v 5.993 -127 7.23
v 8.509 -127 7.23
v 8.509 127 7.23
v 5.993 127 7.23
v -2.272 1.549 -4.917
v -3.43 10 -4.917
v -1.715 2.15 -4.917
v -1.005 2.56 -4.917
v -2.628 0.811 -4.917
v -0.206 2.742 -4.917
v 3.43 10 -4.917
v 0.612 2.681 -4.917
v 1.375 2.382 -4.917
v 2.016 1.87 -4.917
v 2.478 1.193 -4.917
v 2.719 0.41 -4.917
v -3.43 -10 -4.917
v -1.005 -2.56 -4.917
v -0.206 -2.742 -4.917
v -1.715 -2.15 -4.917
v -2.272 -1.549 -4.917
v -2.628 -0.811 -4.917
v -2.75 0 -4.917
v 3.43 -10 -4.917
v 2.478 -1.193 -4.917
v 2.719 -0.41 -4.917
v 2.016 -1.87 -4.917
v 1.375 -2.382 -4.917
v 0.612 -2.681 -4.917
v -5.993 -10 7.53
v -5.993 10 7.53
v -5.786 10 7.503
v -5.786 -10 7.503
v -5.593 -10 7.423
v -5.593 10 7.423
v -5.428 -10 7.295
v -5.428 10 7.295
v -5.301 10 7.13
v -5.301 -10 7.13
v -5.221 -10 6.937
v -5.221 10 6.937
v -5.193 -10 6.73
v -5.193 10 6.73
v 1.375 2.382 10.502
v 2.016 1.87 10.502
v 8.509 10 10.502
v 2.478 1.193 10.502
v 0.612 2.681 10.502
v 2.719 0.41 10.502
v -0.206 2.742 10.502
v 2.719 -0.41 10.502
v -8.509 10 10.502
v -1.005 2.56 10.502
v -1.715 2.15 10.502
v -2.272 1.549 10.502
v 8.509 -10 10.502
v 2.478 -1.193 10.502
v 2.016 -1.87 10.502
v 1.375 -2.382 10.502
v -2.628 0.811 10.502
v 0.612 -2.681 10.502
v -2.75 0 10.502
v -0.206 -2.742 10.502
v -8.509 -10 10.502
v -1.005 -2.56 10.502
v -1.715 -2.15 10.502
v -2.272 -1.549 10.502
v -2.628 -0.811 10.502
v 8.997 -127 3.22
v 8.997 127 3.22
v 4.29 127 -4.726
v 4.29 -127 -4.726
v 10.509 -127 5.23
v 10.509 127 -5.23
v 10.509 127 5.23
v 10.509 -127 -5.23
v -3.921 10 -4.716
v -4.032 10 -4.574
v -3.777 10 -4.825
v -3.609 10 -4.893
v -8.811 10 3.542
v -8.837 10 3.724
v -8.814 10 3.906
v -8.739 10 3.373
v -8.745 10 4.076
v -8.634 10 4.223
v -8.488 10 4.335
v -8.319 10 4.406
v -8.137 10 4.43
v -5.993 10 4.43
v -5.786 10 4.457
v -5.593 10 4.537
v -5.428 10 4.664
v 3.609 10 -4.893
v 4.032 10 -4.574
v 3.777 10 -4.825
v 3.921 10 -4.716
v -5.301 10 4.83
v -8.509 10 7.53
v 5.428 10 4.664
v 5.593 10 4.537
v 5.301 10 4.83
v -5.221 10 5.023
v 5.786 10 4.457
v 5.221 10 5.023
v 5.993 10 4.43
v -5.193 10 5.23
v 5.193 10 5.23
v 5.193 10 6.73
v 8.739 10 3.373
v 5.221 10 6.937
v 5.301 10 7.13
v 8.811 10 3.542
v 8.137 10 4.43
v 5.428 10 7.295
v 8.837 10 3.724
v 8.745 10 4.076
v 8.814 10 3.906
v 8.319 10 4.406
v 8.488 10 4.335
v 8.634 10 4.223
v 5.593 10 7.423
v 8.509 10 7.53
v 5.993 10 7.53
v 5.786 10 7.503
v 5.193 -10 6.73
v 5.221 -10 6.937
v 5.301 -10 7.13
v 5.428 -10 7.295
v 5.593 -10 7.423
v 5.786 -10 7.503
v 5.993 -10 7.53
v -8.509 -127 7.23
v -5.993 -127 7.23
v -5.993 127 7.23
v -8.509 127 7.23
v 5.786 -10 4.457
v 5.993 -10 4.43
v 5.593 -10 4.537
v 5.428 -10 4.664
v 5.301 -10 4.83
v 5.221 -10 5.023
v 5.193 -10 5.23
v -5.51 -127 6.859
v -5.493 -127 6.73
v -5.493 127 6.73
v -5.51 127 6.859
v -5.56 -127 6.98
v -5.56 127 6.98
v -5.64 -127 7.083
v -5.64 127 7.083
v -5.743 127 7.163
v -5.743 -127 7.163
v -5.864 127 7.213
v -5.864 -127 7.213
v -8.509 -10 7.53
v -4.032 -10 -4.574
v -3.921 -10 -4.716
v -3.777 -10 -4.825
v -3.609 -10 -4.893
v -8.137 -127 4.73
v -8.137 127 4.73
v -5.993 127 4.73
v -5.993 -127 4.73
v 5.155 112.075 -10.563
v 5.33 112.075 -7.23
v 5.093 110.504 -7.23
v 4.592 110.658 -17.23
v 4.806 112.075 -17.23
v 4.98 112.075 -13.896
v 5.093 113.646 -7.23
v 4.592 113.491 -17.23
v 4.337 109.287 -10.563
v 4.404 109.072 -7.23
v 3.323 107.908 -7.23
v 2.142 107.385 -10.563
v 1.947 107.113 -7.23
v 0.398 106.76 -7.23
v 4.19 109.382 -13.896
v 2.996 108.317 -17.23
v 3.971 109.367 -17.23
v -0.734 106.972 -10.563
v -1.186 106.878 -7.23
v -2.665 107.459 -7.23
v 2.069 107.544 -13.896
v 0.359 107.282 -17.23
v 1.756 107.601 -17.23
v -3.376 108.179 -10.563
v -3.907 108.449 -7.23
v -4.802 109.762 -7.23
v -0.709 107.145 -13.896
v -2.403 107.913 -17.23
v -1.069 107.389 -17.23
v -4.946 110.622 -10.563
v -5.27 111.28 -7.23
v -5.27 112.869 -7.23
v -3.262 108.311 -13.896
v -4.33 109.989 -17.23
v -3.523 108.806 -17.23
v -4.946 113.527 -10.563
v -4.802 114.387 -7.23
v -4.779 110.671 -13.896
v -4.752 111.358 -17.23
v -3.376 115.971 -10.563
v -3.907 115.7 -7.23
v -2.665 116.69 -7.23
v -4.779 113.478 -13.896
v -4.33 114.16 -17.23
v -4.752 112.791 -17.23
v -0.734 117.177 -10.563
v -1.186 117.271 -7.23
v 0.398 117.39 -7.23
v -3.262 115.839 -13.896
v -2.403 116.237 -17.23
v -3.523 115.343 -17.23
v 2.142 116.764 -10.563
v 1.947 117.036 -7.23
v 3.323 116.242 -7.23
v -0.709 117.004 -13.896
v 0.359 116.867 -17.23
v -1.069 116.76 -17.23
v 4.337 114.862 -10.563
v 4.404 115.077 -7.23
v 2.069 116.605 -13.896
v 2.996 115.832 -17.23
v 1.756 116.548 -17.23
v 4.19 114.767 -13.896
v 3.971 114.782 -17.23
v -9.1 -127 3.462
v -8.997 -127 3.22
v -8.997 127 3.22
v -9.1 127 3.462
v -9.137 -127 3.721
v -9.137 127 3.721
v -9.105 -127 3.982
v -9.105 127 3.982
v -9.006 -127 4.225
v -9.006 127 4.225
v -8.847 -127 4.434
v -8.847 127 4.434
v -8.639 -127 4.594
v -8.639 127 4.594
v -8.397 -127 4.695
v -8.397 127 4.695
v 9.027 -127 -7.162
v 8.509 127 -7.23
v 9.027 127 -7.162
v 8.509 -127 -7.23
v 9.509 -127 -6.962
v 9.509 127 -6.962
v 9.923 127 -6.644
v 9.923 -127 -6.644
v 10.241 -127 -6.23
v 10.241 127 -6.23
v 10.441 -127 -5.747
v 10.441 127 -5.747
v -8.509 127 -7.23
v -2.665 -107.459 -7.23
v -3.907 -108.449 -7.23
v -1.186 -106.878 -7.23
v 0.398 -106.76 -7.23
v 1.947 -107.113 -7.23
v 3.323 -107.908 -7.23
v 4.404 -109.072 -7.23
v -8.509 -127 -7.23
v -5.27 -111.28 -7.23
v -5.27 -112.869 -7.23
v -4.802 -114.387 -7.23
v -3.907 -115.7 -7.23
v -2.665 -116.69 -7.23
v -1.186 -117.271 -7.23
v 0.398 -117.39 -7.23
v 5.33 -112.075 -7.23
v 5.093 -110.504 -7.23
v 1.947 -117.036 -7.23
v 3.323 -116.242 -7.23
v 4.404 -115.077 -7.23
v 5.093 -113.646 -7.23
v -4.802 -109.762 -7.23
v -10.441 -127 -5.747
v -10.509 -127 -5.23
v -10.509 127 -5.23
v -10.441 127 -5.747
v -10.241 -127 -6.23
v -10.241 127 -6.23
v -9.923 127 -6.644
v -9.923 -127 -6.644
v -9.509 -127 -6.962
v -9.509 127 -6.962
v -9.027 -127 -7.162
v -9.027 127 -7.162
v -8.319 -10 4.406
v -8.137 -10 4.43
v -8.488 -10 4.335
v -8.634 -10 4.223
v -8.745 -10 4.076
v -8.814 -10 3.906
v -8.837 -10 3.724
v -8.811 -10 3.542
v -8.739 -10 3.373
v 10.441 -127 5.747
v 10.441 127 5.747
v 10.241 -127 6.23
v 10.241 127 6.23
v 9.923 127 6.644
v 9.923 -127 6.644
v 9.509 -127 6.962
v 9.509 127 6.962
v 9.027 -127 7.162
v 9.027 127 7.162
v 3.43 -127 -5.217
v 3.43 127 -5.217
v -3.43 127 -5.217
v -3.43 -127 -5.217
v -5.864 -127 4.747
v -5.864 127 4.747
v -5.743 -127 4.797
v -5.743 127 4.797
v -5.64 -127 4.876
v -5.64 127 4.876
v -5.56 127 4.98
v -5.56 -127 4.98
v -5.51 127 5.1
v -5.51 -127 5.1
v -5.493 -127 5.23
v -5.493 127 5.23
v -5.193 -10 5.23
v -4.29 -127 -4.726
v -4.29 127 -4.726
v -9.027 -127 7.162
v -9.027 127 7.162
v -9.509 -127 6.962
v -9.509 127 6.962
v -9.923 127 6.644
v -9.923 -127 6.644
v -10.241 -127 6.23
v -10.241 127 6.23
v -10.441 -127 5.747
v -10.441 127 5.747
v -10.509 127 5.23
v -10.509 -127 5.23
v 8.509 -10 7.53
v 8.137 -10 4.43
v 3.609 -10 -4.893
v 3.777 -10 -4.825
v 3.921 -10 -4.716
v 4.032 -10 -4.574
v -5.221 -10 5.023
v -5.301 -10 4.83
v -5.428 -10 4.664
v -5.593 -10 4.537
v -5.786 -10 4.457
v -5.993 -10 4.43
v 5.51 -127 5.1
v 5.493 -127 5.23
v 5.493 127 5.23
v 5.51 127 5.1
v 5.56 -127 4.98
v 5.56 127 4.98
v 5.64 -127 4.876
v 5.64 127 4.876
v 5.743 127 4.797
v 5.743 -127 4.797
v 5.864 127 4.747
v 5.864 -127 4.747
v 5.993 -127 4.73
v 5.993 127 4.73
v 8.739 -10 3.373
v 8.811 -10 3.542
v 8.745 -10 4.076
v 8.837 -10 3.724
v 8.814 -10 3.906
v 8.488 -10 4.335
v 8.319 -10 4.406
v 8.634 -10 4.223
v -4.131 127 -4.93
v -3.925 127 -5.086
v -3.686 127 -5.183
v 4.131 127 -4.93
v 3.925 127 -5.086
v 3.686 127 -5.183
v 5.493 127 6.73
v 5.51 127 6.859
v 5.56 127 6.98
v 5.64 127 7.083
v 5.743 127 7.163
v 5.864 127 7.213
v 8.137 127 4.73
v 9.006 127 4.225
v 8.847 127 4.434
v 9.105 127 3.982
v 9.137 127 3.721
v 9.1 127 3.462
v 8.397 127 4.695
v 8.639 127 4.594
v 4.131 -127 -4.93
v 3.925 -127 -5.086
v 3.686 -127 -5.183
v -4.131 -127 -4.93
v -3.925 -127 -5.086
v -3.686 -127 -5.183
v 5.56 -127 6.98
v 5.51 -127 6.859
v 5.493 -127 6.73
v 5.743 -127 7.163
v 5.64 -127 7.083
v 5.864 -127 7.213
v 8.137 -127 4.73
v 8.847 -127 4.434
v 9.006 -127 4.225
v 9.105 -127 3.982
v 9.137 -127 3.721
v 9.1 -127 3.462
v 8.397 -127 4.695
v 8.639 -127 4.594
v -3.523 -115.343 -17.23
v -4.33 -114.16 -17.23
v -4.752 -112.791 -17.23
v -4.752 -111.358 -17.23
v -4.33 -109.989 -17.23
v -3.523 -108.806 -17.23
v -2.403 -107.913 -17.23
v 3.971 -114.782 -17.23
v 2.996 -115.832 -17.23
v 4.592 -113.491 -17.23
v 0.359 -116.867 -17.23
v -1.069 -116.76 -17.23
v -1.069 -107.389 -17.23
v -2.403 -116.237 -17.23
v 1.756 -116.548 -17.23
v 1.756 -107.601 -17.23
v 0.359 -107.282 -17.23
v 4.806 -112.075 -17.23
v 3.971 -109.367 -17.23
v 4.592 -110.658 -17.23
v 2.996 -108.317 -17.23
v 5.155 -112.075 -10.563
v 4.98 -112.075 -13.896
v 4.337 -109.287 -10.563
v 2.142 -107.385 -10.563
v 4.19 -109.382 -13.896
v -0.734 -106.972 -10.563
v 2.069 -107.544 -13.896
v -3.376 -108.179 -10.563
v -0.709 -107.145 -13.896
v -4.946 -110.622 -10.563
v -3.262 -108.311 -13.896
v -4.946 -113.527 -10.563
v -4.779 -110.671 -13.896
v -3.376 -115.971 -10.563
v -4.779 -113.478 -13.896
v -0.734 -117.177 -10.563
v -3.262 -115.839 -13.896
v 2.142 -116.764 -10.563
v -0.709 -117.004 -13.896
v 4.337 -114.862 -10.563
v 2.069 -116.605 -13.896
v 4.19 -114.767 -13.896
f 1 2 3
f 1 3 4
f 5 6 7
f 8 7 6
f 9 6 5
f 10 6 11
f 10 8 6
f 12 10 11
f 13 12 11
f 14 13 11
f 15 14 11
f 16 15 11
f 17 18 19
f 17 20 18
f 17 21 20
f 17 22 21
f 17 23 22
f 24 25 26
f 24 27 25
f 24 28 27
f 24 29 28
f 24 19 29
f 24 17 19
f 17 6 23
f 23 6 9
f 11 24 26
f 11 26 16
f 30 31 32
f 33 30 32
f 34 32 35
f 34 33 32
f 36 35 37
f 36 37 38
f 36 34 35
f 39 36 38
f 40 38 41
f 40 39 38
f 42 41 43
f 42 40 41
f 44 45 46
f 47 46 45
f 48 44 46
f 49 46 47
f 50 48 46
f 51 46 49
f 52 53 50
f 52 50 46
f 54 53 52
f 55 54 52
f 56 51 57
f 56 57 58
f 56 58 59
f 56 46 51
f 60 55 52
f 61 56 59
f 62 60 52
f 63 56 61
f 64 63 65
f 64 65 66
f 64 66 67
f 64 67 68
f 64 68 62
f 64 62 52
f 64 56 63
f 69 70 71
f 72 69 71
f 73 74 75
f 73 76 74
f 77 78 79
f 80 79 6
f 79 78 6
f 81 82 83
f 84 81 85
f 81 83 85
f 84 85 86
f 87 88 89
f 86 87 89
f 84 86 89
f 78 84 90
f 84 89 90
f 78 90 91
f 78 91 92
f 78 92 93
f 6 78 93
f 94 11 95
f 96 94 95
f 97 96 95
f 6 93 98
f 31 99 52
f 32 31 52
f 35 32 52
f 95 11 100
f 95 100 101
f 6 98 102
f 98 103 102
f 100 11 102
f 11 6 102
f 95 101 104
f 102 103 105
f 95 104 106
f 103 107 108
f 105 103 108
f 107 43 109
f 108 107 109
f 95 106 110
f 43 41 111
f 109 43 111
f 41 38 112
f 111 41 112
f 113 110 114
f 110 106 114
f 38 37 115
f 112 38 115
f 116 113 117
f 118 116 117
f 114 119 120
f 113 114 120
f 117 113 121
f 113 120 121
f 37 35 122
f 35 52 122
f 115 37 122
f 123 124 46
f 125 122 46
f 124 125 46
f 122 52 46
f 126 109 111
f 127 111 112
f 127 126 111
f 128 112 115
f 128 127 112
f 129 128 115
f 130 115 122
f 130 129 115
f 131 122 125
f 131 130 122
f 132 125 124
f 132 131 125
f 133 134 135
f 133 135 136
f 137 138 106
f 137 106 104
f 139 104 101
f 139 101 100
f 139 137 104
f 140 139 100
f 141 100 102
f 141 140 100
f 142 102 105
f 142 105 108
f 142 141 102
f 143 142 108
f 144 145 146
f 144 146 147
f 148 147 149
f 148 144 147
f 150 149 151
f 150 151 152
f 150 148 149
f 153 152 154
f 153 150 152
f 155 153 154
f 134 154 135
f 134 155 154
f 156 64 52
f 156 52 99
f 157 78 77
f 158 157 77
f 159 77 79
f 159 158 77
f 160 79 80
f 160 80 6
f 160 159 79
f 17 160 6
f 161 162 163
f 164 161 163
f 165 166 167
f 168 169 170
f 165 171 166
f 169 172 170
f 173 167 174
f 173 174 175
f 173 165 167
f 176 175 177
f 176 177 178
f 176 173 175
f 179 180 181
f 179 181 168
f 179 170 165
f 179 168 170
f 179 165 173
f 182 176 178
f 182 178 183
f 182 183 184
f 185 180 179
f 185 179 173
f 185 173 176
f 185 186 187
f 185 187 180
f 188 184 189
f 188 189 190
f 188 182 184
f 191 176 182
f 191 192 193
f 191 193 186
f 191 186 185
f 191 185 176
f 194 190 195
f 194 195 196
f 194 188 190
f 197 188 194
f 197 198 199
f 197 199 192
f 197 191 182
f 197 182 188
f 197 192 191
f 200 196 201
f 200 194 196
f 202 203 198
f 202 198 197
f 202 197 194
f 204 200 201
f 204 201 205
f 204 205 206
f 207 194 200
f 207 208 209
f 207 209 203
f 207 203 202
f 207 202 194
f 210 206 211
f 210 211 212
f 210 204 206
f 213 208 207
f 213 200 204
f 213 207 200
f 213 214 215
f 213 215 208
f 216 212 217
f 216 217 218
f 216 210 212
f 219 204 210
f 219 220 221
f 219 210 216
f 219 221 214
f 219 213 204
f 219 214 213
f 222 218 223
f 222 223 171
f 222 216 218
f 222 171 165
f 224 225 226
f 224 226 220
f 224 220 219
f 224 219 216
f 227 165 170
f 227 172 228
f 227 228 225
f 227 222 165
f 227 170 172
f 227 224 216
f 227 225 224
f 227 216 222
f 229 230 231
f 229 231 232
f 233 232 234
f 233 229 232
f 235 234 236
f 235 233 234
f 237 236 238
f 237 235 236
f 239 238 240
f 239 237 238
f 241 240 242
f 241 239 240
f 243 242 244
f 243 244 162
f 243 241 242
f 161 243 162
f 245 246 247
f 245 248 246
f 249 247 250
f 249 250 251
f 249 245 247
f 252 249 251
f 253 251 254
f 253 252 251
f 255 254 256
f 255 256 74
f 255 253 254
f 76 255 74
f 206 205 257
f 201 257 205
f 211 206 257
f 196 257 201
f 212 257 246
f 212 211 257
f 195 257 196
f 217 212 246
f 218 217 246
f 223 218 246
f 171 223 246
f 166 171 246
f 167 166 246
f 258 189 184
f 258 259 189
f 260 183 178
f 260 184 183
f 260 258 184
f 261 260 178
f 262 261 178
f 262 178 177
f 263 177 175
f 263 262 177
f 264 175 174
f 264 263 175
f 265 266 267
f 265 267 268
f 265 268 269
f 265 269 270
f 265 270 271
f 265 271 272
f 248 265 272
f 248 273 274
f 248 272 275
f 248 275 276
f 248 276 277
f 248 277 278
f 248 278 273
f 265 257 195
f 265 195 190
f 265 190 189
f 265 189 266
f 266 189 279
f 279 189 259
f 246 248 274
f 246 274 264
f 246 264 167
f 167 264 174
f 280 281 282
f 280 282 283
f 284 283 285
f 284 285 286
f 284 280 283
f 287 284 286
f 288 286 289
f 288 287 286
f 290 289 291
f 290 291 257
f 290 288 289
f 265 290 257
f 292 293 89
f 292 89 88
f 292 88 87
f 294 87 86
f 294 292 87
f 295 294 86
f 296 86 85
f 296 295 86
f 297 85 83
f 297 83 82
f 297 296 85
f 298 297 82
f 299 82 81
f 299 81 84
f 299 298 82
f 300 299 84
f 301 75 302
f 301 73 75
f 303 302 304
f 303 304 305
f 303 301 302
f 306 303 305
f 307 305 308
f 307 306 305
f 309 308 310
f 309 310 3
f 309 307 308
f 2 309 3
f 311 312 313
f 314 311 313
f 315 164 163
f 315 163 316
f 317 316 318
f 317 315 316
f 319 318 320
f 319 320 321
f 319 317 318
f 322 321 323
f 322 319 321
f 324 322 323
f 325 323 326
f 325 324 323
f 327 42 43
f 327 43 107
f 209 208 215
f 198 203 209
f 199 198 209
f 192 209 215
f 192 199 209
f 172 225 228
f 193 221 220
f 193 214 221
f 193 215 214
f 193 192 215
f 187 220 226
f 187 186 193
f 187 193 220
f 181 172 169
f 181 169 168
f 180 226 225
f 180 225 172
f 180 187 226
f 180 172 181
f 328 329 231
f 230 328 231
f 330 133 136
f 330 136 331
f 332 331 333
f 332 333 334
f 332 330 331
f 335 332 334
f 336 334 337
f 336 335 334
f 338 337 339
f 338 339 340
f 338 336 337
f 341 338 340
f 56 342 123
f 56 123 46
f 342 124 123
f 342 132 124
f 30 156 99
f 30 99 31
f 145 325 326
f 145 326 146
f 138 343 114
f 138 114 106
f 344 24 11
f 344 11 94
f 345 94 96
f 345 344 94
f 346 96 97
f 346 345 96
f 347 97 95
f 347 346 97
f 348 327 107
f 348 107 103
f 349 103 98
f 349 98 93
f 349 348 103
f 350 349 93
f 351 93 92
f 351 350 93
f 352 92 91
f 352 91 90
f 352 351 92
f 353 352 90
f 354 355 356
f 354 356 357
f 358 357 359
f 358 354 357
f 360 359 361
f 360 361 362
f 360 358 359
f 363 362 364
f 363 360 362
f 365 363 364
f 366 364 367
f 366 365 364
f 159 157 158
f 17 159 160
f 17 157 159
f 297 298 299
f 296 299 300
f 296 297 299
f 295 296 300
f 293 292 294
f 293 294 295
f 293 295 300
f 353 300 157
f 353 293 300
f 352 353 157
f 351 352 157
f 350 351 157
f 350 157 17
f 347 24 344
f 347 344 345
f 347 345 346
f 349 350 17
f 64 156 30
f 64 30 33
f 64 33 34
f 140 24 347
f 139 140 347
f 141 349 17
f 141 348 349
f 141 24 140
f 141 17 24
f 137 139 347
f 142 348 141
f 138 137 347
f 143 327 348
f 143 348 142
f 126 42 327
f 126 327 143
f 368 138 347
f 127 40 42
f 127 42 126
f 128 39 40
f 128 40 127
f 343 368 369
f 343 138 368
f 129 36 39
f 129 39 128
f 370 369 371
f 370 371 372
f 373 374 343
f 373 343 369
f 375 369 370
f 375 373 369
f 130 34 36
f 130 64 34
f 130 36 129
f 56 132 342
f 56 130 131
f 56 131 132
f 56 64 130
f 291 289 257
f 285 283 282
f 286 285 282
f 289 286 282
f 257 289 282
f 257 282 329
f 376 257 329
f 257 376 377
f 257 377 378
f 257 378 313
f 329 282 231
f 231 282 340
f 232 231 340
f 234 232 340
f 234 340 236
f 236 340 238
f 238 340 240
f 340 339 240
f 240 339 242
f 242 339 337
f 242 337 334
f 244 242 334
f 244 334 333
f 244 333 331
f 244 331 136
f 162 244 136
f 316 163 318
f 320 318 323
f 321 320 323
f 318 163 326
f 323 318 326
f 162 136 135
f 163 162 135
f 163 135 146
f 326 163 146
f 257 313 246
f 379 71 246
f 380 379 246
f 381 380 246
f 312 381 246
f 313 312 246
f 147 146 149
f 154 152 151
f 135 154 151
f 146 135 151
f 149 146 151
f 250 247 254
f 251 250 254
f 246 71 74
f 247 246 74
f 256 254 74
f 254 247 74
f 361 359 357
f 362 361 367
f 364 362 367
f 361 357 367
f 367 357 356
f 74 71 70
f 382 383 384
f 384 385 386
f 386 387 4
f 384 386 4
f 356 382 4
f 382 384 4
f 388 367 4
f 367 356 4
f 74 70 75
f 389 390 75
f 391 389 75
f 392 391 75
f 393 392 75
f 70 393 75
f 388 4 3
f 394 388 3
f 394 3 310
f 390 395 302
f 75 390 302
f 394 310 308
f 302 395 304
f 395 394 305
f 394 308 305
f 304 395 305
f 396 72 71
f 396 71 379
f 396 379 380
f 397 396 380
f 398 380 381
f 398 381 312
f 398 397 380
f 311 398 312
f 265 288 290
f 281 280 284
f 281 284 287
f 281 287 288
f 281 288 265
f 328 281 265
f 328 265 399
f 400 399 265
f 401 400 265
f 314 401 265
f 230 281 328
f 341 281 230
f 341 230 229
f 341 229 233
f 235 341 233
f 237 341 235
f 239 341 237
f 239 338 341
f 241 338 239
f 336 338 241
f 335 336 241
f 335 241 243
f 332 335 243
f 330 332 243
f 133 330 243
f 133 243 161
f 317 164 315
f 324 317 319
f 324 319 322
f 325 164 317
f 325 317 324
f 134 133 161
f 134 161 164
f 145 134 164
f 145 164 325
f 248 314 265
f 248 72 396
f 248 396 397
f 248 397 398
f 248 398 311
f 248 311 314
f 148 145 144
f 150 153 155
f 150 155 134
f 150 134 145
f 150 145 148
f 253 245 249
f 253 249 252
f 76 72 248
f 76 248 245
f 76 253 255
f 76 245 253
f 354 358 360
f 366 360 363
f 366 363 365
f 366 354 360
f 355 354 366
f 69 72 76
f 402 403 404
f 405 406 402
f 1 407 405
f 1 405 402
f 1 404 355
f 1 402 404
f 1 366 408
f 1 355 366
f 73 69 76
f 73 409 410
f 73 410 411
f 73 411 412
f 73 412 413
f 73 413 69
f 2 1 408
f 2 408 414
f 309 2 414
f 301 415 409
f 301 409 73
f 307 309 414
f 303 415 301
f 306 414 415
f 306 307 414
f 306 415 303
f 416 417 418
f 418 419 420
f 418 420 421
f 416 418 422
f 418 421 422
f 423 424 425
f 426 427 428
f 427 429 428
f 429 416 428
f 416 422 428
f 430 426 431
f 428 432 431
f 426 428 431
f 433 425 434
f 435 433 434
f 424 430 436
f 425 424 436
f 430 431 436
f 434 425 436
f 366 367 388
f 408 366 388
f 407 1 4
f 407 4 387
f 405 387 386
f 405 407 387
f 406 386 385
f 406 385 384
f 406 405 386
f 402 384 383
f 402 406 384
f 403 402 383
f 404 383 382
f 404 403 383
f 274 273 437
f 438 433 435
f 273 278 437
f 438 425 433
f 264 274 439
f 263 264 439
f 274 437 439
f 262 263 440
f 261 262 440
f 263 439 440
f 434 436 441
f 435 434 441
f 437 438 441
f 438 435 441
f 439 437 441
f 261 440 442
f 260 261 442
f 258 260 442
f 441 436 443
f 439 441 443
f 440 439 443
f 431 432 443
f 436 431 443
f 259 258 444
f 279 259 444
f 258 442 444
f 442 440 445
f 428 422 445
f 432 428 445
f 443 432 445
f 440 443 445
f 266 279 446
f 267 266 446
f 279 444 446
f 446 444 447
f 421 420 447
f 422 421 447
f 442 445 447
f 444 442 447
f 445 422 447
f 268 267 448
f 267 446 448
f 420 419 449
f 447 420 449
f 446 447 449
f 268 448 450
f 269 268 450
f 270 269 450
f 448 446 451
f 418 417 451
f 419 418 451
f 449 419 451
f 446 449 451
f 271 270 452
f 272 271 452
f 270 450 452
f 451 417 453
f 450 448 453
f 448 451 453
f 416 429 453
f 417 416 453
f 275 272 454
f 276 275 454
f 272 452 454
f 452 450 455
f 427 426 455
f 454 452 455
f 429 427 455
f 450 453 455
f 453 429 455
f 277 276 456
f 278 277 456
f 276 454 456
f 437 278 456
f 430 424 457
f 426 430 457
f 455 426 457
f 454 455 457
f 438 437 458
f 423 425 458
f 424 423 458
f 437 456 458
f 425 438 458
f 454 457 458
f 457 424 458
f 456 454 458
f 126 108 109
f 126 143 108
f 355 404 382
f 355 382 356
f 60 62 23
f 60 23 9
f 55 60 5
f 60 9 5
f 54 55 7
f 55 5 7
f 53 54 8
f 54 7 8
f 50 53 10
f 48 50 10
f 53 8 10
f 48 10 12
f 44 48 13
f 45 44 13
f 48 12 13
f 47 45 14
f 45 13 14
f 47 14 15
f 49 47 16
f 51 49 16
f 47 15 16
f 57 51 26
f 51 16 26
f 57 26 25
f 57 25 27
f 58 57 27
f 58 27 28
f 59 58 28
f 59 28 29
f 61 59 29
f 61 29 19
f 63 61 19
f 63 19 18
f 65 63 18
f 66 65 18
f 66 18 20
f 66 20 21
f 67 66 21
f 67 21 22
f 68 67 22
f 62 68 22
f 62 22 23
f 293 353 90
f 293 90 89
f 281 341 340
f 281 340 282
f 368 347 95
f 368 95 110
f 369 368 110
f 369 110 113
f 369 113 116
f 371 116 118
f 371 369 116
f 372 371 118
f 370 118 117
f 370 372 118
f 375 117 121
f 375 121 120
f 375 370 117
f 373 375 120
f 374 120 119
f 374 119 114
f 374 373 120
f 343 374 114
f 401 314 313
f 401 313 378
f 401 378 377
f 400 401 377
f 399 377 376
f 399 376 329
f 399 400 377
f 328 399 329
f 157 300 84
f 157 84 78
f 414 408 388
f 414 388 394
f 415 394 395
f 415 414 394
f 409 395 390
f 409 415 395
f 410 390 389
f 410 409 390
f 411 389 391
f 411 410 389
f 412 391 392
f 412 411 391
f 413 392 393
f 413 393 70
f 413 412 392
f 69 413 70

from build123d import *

# Parameters (mm, degrees)
F1_DEPTH = 127
F3_DEPTH = 10
F5_D     = 5.5
F5_DEPTH = 90
F5_TIP   = 1.6523667023
F6_R     = 5.3298784099
F7_DEPTH = 10
F7_TAPER = 3


# Not quite as in the source:
# - a pattern or mirror of a feature is missing from the dataset's text; its kind, count and spacing are read off the source's solid


with BuildPart() as f1:
    # F0 (on Front) → F1 (new body, symmetric)
    with BuildSketch(Plane.XZ):
        with BuildLine():
            ThreePointArc((10.5092503586, 5.2297932934), (9.923463921, 6.6440068557), (8.5092503586, 7.2297932934))
            Line((8.5092503586, 7.2297932934), (5.9933694905, 7.2297932934))
            ThreePointArc((5.9933694905, 7.2297932934), (5.6398160999, 7.083346684), (5.4933694905, 6.7297932934))
            Line((5.4933694905, 6.7297932934), (5.4933694905, 5.2297932934))
            ThreePointArc((5.4933694905, 5.2297932934), (5.6398160999, 4.8762399028), (5.9933694905, 4.7297932934))
            Line((5.9933694905, 4.7297932934), (8.1368030805, 4.7297932934))
            ThreePointArc((8.1368030805, 4.7297932934), (9.0055991387, 4.2249633746), (8.9972067099, 3.220180112))
            Line((8.9972067099, 3.220180112), (4.2904538965, -4.726449511))
            ThreePointArc((4.2904538965, -4.726449511), (3.9252203484, -5.0856323878), (3.4300502672, -5.2168363297))
            Line((3.4300502672, -5.2168363297), (0, -5.2168363297))
            Line((0, -5.2168363297), (-3.4300502672, -5.2168363297))
            ThreePointArc((-3.4300502672, -5.2168363297), (-3.9252203484, -5.0856323878), (-4.2904538965, -4.726449511))
            Line((-4.2904538965, -4.726449511), (-8.9972067099, 3.220180112))
            ThreePointArc((-8.9972067099, 3.220180112), (-9.0055991387, 4.2249633746), (-8.1368030805, 4.7297932934))
            Line((-8.1368030805, 4.7297932934), (-5.9933694905, 4.7297932934))
            ThreePointArc((-5.9933694905, 4.7297932934), (-5.6398160999, 4.8762399028), (-5.4933694905, 5.2297932934))
            Line((-5.4933694905, 5.2297932934), (-5.4933694905, 6.7297932934))
            ThreePointArc((-5.4933694905, 6.7297932934), (-5.6398160999, 7.083346684), (-5.9933694905, 7.2297932934))
            Line((-5.9933694905, 7.2297932934), (-8.5092503586, 7.2297932934))
            ThreePointArc((-8.5092503586, 7.2297932934), (-9.923463921, 6.6440068557), (-10.5092503586, 5.2297932934))
            Line((-10.5092503586, 5.2297932934), (-10.5092503586, -5.2297932934))
            ThreePointArc((-10.5092503586, -5.2297932934), (-9.923463921, -6.6440068557), (-8.5092503586, -7.2297932934))
            Line((-8.5092503586, -7.2297932934), (8.5092503586, -7.2297932934))
            ThreePointArc((8.5092503586, -7.2297932934), (9.923463921, -6.6440068557), (10.5092503586, -5.2297932934))
            Line((10.5092503586, -5.2297932934), (10.5092503586, 5.2297932934))
        make_face()
    extrude(amount=F1_DEPTH, both=True)

    # F6 (on face) → F7 (join)
    with BuildSketch(Plane(origin=(0, 0, -7.2297932934), x_dir=(1, 0, 0), z_dir=(0, 0, -1))):
        with Locations((0, -112.07459867)):
            Circle(F6_R)
    f7 = extrude(amount=F7_DEPTH, taper=F7_TAPER)

    # F7_copies: F7 across plane
    add(f7.mirror(Plane(origin=(0, 0, 0), x_dir=(0, 0, -1), z_dir=(0, -1, 0))))


with BuildPart() as f3:
    # F2 (on Front) → F3 (new body, symmetric)
    with BuildSketch(Plane.XZ):
        with BuildLine():
            Line((5.9933694905, 7.5297932934), (8.5092503586, 7.5297932934))
            Line((8.5092503586, 7.5297932934), (8.5092503586, 10.502230376))
            Line((8.5092503586, 10.502230376), (-8.5092503586, 10.502230376))
            Line((-8.5092503586, 10.502230376), (-8.5092503586, 7.5297932934))
            Line((-8.5092503586, 7.5297932934), (-5.9933694905, 7.5297932934))
            ThreePointArc((-5.9933694905, 7.5297932934), (-5.4276840655, 7.2954787183), (-5.1933694905, 6.7297932934))
            Line((-5.1933694905, 6.7297932934), (-5.1933694905, 5.2297932934))
            ThreePointArc((-5.1933694905, 5.2297932934), (-5.4276840655, 4.6641078684), (-5.9933694905, 4.4297932934))
            Line((-5.9933694905, 4.4297932934), (-8.1368030805, 4.4297932934))
            ThreePointArc((-8.1368030805, 4.4297932934), (-8.7449603212, 4.0764123502), (-8.7390856211, 3.3730640664))
            Line((-8.7390856211, 3.3730640664), (-4.0323328077, -4.5735655566))
            ThreePointArc((-4.0323328077, -4.5735655566), (-3.776669324, -4.8249935704), (-3.4300502672, -4.9168363297))
            Line((-3.4300502672, -4.9168363297), (3.4300502672, -4.9168363297))
            ThreePointArc((3.4300502672, -4.9168363859), (3.7766693519, -4.8249936193), (4.0323328561, -4.5735655853))
            Line((4.0323328077, -4.5735655566), (8.7390856211, 3.3730640664))
            ThreePointArc((8.7390856211, 3.3730640664), (8.7449603212, 4.0764123502), (8.1368030805, 4.4297932934))
            Line((8.1368030805, 4.4297932934), (5.9933694905, 4.4297932934))
            ThreePointArc((5.9933694905, 4.4297932934), (5.4276840655, 4.6641078684), (5.1933694905, 5.2297932934))
            Line((5.1933694905, 5.2297932934), (5.1933694905, 6.7297932934))
            ThreePointArc((5.1933694905, 6.7297932934), (5.4276840655, 7.2954787183), (5.9933694905, 7.5297932934))
        make_face()
    extrude(amount=F3_DEPTH, both=True)

    # F5
    with Locations(Plane.XY.offset(10.502230376)):
        with Locations((0, 0)):
            Hole(F5_D / 2, depth=F5_DEPTH)
            with Locations((0, 0, -(F5_DEPTH + F5_TIP / 2))):  # 118° drill point
                Cone(0, F5_D / 2, F5_TIP, mode=Mode.SUBTRACT)


solid = Compound([f1.part, f3.part])
